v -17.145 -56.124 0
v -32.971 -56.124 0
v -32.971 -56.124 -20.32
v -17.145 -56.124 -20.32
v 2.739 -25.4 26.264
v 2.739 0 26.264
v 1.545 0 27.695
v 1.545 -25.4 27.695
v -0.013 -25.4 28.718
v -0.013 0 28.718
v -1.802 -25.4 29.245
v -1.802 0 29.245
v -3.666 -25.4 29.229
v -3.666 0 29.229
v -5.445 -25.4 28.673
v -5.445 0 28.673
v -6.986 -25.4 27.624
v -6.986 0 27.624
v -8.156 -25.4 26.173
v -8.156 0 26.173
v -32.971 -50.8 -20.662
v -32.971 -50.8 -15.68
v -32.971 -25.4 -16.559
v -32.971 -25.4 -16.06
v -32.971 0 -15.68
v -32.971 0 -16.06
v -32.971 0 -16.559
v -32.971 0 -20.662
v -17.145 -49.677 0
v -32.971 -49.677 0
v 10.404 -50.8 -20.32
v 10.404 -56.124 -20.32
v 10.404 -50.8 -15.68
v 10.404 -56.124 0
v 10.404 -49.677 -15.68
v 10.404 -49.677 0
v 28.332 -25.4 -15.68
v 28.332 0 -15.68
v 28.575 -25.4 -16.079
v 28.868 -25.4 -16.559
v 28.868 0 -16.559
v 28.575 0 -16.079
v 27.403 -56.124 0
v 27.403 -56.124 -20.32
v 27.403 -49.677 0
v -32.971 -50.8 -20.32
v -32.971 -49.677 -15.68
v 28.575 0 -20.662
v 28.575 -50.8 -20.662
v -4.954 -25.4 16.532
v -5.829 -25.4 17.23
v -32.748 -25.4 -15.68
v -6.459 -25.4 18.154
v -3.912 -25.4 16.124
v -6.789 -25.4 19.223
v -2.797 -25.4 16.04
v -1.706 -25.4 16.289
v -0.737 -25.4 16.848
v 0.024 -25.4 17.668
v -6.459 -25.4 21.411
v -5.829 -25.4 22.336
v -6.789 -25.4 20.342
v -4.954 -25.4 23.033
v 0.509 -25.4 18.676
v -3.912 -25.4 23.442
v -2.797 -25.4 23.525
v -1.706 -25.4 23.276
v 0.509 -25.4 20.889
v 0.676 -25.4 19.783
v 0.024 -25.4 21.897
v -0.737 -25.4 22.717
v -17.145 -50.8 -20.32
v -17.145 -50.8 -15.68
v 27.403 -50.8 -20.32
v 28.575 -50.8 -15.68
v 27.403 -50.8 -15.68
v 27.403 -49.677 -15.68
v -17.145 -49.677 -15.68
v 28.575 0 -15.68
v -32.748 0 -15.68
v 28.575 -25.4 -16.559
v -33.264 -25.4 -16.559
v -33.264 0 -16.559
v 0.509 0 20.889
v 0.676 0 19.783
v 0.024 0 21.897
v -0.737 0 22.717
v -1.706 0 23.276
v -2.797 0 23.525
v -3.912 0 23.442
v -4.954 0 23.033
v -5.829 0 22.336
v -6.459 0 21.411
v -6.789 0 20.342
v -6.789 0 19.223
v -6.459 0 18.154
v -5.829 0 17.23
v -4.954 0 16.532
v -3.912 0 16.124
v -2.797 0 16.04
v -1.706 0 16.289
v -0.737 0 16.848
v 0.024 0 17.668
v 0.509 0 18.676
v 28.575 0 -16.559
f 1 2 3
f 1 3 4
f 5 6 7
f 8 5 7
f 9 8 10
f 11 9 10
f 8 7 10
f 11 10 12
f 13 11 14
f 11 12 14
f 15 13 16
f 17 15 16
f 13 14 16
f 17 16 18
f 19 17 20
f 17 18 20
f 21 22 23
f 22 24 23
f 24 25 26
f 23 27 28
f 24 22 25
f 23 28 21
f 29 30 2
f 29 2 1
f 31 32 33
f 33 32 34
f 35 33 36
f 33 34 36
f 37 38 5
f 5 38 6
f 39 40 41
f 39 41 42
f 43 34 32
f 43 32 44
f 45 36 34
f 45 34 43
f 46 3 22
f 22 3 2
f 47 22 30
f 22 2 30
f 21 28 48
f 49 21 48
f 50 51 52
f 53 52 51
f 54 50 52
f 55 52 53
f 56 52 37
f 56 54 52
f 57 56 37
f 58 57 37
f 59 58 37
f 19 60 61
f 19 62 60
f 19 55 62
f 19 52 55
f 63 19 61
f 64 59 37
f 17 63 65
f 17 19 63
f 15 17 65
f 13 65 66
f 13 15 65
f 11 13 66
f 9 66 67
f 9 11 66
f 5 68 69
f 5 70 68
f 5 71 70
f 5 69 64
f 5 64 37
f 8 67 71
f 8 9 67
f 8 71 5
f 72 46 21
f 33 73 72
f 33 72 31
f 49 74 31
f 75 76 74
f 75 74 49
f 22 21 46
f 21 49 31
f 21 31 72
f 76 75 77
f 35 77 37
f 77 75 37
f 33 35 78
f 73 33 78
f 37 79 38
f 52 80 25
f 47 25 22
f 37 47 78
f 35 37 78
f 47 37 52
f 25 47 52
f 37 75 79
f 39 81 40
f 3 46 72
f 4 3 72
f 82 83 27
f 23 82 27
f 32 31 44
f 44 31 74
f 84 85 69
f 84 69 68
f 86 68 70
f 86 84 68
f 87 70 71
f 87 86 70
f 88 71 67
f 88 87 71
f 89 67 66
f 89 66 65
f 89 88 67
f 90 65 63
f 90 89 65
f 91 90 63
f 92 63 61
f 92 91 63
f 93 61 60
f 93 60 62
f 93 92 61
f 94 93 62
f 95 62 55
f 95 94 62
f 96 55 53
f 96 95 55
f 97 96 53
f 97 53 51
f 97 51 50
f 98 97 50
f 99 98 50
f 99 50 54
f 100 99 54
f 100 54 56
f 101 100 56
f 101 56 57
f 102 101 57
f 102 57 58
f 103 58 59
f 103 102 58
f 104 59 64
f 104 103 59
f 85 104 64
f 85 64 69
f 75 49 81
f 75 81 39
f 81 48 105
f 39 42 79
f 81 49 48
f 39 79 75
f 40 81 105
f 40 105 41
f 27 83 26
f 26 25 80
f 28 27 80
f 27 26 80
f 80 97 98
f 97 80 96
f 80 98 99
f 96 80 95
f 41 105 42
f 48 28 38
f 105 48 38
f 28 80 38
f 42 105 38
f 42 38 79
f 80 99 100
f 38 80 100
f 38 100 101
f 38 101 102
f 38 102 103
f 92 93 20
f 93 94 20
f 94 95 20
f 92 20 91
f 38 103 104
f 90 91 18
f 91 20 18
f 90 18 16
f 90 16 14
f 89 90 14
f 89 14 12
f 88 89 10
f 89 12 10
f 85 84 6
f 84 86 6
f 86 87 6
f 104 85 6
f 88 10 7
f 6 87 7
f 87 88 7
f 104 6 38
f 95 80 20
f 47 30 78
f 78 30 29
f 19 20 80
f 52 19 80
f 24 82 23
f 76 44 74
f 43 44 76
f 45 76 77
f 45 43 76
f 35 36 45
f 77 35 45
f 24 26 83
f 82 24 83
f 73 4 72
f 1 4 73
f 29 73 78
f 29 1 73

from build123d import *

# Parameters (mm, degrees)
F0_R     = 3.753216
F1_DEPTH = 25.4
F3_DEPTH = 50.8
F4_W     = 15.826155
F4_H     = 6.447691
F4_W_2   = 16.998462
F5_DEPTH = 20.32


with BuildPart() as f1:
    # F0 (on Front) → F1 (new body)
    with BuildSketch(Plane.XZ):
        with BuildLine():
            Line((-8.156309, 26.172908), (-33.264231, -16.558846))
            Line((-33.264231, -16.558846), (28.868075, -16.558846))
            Line((28.868075, -16.558846), (2.739173, 26.263524))
            ThreePointArc((2.739173, 26.263524), (-2.734247, 29.305814), (-8.156309, 26.172908))
        make_face()
        with Locations((-3.077308, 19.782692)):
            Circle(F0_R, mode=Mode.SUBTRACT)
    extrude(amount=F1_DEPTH)

    # F2 (on Front) → F3 (join)
    with BuildSketch(Plane.XZ):
        Polygon((28.574998, -15.679616), (-32.971155, -15.679616), (-32.971155, -20.661924), (-18.911924, -20.661924), (11.673916, -20.661924), (28.574998, -20.661924), align=None)
    extrude(amount=F3_DEPTH)

    # F4 (on Top) → F5 (join)
    with BuildSketch(Plane.XY):
        with Locations((-25.058077, -52.900384)):
            Rectangle(F4_W, F4_H)
        with Locations((18.903461, -52.900384)):
            Rectangle(F4_W_2, F4_H)
    extrude(amount=-F5_DEPTH)


solid = f1.part
